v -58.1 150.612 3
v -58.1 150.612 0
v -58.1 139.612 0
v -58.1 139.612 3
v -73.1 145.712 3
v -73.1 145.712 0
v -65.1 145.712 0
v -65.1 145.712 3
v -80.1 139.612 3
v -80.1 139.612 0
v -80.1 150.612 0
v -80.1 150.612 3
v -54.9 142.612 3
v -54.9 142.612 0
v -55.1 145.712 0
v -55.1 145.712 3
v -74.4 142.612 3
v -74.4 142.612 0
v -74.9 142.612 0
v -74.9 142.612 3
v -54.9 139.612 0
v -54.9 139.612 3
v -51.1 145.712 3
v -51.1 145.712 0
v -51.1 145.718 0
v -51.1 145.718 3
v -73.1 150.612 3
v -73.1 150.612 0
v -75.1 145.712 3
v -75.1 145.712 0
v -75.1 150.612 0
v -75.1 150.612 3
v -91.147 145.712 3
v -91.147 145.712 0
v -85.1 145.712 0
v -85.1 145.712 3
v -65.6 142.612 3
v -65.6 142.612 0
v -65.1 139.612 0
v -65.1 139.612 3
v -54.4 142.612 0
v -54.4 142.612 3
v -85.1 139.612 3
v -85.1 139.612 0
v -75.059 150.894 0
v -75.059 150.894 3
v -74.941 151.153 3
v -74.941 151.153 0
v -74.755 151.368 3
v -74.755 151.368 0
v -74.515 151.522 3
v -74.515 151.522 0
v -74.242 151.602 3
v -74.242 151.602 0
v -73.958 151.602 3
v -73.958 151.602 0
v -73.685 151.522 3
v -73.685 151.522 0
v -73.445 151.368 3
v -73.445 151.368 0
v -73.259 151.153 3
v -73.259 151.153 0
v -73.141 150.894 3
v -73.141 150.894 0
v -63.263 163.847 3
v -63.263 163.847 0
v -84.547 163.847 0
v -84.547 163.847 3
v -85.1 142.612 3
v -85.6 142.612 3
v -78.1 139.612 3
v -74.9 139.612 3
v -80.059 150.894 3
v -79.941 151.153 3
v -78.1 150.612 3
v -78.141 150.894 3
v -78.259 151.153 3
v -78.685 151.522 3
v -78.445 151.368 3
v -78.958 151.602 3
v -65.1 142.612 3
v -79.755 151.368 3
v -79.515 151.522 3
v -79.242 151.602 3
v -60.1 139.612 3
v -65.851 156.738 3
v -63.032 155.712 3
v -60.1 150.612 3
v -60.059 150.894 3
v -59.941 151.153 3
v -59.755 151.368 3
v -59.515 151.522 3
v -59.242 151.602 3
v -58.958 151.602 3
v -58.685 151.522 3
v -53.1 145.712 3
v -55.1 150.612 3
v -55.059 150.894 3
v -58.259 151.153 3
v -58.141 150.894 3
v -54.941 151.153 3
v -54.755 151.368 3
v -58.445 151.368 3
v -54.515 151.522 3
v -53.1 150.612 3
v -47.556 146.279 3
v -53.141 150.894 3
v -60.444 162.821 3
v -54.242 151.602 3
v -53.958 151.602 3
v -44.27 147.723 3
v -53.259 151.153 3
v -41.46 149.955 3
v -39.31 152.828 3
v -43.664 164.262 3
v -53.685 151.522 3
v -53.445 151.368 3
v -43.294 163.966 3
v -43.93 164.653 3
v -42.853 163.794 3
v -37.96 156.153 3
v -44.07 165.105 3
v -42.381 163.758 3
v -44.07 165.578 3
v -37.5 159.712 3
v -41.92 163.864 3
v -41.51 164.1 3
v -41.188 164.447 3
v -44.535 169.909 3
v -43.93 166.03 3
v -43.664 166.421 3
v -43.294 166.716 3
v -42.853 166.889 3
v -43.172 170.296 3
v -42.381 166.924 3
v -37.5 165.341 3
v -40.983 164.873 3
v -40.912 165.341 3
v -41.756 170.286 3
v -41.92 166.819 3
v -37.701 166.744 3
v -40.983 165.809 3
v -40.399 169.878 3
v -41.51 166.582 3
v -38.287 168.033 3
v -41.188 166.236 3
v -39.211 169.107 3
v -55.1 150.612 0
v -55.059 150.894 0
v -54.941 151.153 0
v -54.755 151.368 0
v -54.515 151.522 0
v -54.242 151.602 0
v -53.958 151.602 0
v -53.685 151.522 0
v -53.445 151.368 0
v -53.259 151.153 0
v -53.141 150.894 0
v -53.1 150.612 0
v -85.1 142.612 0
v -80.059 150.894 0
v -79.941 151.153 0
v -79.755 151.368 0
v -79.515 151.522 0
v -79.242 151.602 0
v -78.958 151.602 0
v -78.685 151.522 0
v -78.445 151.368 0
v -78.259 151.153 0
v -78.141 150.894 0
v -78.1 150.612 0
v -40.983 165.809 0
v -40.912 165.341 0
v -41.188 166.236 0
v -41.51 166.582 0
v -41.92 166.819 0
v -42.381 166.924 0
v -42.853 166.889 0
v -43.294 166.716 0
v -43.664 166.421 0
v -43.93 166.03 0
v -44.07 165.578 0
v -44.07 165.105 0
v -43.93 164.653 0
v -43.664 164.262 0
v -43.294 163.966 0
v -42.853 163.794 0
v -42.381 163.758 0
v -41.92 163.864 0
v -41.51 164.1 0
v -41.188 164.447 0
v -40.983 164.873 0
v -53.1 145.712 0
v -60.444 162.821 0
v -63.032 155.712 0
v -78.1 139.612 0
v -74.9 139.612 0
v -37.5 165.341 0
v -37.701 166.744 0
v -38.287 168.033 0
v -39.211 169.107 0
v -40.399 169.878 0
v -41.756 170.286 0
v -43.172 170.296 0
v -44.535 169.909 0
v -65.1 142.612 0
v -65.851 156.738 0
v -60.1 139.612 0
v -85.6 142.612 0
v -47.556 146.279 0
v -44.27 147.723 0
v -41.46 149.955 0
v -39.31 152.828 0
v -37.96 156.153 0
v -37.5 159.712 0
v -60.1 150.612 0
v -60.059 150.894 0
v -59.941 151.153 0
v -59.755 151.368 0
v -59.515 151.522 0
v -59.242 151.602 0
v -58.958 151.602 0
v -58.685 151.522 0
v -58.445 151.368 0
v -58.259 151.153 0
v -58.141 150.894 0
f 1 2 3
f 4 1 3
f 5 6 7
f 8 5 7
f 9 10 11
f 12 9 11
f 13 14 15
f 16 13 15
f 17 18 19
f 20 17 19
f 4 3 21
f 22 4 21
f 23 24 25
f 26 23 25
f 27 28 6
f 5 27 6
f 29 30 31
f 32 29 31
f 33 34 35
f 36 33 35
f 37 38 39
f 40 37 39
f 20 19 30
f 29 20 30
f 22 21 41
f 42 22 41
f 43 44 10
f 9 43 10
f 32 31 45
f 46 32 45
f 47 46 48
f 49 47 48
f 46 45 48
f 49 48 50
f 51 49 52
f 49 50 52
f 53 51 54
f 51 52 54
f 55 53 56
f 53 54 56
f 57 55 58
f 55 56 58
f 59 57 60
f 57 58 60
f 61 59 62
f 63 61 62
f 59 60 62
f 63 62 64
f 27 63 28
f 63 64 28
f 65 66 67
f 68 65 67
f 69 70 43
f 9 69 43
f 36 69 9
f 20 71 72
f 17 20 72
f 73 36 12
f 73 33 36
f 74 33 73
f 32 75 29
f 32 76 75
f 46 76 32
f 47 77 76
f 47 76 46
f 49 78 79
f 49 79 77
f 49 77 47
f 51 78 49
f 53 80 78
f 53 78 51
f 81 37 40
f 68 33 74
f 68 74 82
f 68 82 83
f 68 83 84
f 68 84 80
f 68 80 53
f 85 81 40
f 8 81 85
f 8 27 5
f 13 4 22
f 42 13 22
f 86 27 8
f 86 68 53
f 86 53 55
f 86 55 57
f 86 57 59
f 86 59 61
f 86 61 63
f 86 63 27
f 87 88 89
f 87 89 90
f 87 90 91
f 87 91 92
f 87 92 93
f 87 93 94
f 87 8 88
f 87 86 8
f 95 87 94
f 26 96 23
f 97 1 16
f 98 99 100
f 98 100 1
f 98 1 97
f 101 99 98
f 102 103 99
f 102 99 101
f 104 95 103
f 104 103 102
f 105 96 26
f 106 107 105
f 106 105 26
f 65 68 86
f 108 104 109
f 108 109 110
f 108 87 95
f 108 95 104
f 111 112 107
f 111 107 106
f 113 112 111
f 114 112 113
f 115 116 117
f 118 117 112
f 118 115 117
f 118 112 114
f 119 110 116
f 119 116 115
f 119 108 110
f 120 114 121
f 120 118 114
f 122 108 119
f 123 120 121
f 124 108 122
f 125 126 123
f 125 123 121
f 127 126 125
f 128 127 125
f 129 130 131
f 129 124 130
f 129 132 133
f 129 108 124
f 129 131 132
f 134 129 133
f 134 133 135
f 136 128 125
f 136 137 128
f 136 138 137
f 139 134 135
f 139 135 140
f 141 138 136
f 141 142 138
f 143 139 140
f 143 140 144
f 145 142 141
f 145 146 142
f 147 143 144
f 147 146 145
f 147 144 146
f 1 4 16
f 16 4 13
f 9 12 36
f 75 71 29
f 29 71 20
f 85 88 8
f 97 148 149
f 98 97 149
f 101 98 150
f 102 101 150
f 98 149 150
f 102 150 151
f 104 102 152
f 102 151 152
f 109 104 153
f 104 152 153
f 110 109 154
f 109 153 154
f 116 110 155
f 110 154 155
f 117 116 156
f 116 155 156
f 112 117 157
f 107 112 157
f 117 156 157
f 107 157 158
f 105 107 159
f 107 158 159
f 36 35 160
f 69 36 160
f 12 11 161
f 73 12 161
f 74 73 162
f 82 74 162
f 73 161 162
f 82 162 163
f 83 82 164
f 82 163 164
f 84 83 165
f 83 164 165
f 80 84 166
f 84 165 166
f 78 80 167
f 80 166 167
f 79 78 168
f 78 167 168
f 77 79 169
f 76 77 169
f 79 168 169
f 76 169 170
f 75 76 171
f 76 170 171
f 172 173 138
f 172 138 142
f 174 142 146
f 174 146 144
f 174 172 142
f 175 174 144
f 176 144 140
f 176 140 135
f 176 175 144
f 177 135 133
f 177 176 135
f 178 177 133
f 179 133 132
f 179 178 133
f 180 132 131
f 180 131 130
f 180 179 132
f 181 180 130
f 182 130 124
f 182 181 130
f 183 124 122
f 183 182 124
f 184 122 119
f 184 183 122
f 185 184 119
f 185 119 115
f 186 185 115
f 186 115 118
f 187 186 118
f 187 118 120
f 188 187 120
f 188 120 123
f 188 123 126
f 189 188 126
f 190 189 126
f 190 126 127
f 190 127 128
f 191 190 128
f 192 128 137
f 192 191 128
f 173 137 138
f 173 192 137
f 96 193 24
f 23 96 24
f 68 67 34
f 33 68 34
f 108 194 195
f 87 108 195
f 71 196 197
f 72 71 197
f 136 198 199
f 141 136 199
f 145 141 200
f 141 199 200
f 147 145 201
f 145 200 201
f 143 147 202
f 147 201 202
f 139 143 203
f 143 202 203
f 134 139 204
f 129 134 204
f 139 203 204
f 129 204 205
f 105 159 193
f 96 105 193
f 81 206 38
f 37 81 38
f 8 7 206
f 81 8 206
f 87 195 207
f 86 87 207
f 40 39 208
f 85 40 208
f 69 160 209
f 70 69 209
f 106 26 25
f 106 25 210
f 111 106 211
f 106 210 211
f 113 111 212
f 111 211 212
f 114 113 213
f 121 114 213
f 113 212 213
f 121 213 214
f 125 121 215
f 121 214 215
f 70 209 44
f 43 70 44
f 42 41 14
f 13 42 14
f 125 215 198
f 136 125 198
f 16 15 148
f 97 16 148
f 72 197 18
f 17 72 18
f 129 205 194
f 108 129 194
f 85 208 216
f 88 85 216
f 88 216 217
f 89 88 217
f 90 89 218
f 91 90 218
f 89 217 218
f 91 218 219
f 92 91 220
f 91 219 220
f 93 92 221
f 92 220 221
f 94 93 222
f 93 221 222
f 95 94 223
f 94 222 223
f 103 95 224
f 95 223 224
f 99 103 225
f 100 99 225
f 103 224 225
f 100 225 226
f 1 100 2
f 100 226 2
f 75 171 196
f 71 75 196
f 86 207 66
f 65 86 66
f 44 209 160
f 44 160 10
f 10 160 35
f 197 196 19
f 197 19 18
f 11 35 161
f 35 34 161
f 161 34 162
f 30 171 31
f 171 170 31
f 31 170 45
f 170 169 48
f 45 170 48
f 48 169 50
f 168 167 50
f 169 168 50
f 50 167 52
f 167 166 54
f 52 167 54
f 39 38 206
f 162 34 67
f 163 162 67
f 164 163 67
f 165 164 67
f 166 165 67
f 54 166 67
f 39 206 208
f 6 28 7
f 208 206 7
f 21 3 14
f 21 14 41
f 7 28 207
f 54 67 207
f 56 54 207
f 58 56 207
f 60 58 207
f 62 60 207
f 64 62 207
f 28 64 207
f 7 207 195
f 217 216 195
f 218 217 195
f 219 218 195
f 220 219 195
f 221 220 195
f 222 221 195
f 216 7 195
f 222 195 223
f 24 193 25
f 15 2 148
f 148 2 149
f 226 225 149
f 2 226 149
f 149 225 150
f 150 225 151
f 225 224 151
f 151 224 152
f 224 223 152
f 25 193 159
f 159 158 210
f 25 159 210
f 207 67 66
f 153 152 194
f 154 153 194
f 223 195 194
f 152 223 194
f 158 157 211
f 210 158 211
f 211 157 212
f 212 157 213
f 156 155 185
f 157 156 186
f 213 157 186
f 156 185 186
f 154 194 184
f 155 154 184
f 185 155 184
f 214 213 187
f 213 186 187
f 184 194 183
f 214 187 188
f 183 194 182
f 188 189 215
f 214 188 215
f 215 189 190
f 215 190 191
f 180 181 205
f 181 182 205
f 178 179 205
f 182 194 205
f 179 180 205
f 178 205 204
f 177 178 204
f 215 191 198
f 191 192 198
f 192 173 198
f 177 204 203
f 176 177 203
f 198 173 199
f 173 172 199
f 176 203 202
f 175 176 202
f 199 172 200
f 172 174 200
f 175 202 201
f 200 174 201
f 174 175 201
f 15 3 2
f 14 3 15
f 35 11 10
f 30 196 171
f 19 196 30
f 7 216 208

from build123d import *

# Parameters (mm, degrees)
SKETCH1_R           = 1.5875
BOSS_EXTRUDE1_DEPTH = 3
TABS_DEPTH          = 3
TAB_RELIEF_REACH    = 195.217


with BuildPart() as part:
    # Sketch1 → Boss-Extrude1 (new body)
    with BuildSketch(Plane.XY):
        with BuildLine():
            Line((-44.534658728, 169.908603759), (-60.444091073, 162.821196289))
            Line((-60.444091073, 162.821196289), (-63.031525128, 155.712279649))
            Line((-63.031525128, 155.712279649), (-65.85060299, 156.738340079))
            Line((-65.85060299, 156.738340079), (-63.263168935, 163.847256719))
            Line((-63.263168935, 163.847256719), (-84.546724385, 163.847256719))
            Line((-84.546724385, 163.847256719), (-91.147316237, 145.712279649))
            Line((-91.147316237, 145.712279649), (-51.5, 145.712279649))
            ThreePointArc((-51.5, 145.712279649), (-41.600505063, 149.812784712), (-37.5, 159.712279649))
            Line((-37.5, 159.712279649), (-37.5, 165.341310922))
            ThreePointArc((-37.5, 165.341310922), (-39.777252641, 169.534954543), (-44.534658728, 169.908603759))
        make_face()
        with Locations((-42.5, 165.341310922)):
            Circle(SKETCH1_R, mode=Mode.SUBTRACT)
    extrude(amount=BOSS_EXTRUDE1_DEPTH)

    # Sketch3 → tabs (add)
    with BuildSketch(Plane(origin=(0, 0, 0), x_dir=(-1, 0, 0), z_dir=(0, 0, -1))):
        with BuildLine():
            Line((54.9, 142.612279649), (55.1, 145.712279649))
            Line((55.1, 145.712279649), (55.1, 150.612279649))
            ThreePointArc((55.1, 150.612279649), (54.1, 151.612279649), (53.1, 150.612279649))
            Line((53.1, 150.612279649), (53.1, 145.712279649))
            Line((53.1, 145.712279649), (51.1, 145.712279649))
            Line((51.1, 145.712279649), (51.1, 152.712279649))
            Line((51.1, 152.712279649), (67.1, 152.712279649))
            Line((67.1, 152.712279649), (67.1, 145.712279649))
            Line((67.1, 145.712279649), (65.1, 145.712279649))
            Line((65.1, 145.712279649), (65.1, 142.612279649))
            Line((65.1, 142.612279649), (65.6, 142.612279649))
            Line((65.6, 142.612279649), (65.1, 139.612279649))
            Line((65.1, 139.612279649), (60.1, 139.612279649))
            Line((60.1, 139.612279649), (60.1, 150.612279649))
            ThreePointArc((60.1, 150.612279649), (59.1, 151.612279649), (58.1, 150.612279649))
            Line((58.1, 150.612279649), (58.1, 139.612279649))
            Line((58.1, 139.612279649), (54.9, 139.612279649))
            Line((54.9, 139.612279649), (54.4, 142.612279649))
            Line((54.4, 142.612279649), (54.9, 142.612279649))
        make_face()
        with BuildLine():
            Line((74.9, 142.612279649), (75.1, 145.712279649))
            Line((75.1, 145.712279649), (75.1, 150.612279649))
            ThreePointArc((75.1, 150.612279649), (74.1, 151.612279649), (73.1, 150.612279649))
            Line((73.1, 150.612279649), (73.1, 145.712279649))
            Line((73.1, 145.712279649), (71.1, 145.712279649))
            Line((71.1, 145.712279649), (71.1, 152.712279649))
            Line((71.1, 152.712279649), (87.1, 152.712279649))
            Line((87.1, 152.712279649), (87.1, 145.712279649))
            Line((87.1, 145.712279649), (85.1, 145.712279649))
            Line((85.1, 145.712279649), (85.1, 142.612279649))
            Line((85.1, 142.612279649), (85.6, 142.612279649))
            Line((85.6, 142.612279649), (85.1, 139.612279649))
            Line((85.1, 139.612279649), (80.1, 139.612279649))
            Line((80.1, 139.612279649), (80.1, 150.612279649))
            ThreePointArc((80.1, 150.612279649), (79.1, 151.612279649), (78.1, 150.612279649))
            Line((78.1, 150.612279649), (78.1, 139.612279649))
            Line((78.1, 139.612279649), (74.9, 139.612279649))
            Line((74.9, 139.612279649), (74.4, 142.612279649))
            Line((74.4, 142.612279649), (74.9, 142.612279649))
        make_face()
    extrude(amount=-TABS_DEPTH)

    # Sketch4 → tab relief (cut, up to next)
    with BuildSketch(Plane(origin=(0, 0, 0), x_dir=(-1, 0, 0), z_dir=(0, 0, -1)), mode=Mode.PRIVATE) as tab_relief_sk1:
        with BuildLine():
            Line((55.1, 145.712279649), (55.1, 150.612279649))
            ThreePointArc((55.1, 150.612279649), (54.1, 151.612279649), (53.1, 150.612279649))
            Line((53.1, 150.612279649), (53.1, 145.712279649))
            Line((53.1, 145.712279649), (55.1, 145.712279649))
        make_face()
    tab_relief_tool1 = extrude(tab_relief_sk1.sketch, amount=-TAB_RELIEF_REACH, mode=Mode.PRIVATE) & part.part
    # Sketch4 → tab relief (cut, up to next)
    with BuildSketch(Plane(origin=(0, 0, 0), x_dir=(-1, 0, 0), z_dir=(0, 0, -1)), mode=Mode.PRIVATE) as tab_relief_sk2:
        with BuildLine():
            Line((75.1, 145.712279649), (75.1, 150.612279649))
            ThreePointArc((75.1, 150.612279649), (74.1, 151.612279649), (73.1, 150.612279649))
            Line((73.1, 150.612279649), (73.1, 145.712279649))
            Line((73.1, 145.712279649), (75.1, 145.712279649))
        make_face()
    tab_relief_tool2 = extrude(tab_relief_sk2.sketch, amount=-TAB_RELIEF_REACH, mode=Mode.PRIVATE) & part.part
    # Sketch4 → tab relief (cut, up to next)
    with BuildSketch(Plane(origin=(0, 0, 0), x_dir=(-1, 0, 0), z_dir=(0, 0, -1)), mode=Mode.PRIVATE) as tab_relief_sk3:
        with BuildLine():
            Line((58.1, 150.612279649), (58.1, 145.712279649))
            Line((58.1, 145.712279649), (60.1, 145.712279649))
            Line((60.1, 145.712279649), (60.1, 150.612279649))
            ThreePointArc((60.1, 150.612279649), (59.1, 151.612279649), (58.1, 150.612279649))
        make_face()
    tab_relief_tool3 = extrude(tab_relief_sk3.sketch, amount=-TAB_RELIEF_REACH, mode=Mode.PRIVATE) & part.part
    # Sketch4 → tab relief (cut, up to next)
    with BuildSketch(Plane(origin=(0, 0, 0), x_dir=(-1, 0, 0), z_dir=(0, 0, -1)), mode=Mode.PRIVATE) as tab_relief_sk4:
        with BuildLine():
            Line((78.1, 150.612279649), (78.1, 145.712279649))
            Line((78.1, 145.712279649), (80.1, 145.712279649))
            Line((80.1, 145.712279649), (80.1, 150.612279649))
            ThreePointArc((80.1, 150.612279649), (79.1, 151.612279649), (78.1, 150.612279649))
        make_face()
    tab_relief_tool4 = extrude(tab_relief_sk4.sketch, amount=-TAB_RELIEF_REACH, mode=Mode.PRIVATE) & part.part
    add(tab_relief_tool1.solids().sort_by_distance((-54.1, 148.55936, 0))[0], mode=Mode.SUBTRACT)
    add(tab_relief_tool2.solids().sort_by_distance((-74.1, 148.55936, 0))[0], mode=Mode.SUBTRACT)
    add(tab_relief_tool3.solids().sort_by_distance((-59.1, 148.55936, 0))[0], mode=Mode.SUBTRACT)
    add(tab_relief_tool4.solids().sort_by_distance((-79.1, 148.55936, 0))[0], mode=Mode.SUBTRACT)


solid = part.part
